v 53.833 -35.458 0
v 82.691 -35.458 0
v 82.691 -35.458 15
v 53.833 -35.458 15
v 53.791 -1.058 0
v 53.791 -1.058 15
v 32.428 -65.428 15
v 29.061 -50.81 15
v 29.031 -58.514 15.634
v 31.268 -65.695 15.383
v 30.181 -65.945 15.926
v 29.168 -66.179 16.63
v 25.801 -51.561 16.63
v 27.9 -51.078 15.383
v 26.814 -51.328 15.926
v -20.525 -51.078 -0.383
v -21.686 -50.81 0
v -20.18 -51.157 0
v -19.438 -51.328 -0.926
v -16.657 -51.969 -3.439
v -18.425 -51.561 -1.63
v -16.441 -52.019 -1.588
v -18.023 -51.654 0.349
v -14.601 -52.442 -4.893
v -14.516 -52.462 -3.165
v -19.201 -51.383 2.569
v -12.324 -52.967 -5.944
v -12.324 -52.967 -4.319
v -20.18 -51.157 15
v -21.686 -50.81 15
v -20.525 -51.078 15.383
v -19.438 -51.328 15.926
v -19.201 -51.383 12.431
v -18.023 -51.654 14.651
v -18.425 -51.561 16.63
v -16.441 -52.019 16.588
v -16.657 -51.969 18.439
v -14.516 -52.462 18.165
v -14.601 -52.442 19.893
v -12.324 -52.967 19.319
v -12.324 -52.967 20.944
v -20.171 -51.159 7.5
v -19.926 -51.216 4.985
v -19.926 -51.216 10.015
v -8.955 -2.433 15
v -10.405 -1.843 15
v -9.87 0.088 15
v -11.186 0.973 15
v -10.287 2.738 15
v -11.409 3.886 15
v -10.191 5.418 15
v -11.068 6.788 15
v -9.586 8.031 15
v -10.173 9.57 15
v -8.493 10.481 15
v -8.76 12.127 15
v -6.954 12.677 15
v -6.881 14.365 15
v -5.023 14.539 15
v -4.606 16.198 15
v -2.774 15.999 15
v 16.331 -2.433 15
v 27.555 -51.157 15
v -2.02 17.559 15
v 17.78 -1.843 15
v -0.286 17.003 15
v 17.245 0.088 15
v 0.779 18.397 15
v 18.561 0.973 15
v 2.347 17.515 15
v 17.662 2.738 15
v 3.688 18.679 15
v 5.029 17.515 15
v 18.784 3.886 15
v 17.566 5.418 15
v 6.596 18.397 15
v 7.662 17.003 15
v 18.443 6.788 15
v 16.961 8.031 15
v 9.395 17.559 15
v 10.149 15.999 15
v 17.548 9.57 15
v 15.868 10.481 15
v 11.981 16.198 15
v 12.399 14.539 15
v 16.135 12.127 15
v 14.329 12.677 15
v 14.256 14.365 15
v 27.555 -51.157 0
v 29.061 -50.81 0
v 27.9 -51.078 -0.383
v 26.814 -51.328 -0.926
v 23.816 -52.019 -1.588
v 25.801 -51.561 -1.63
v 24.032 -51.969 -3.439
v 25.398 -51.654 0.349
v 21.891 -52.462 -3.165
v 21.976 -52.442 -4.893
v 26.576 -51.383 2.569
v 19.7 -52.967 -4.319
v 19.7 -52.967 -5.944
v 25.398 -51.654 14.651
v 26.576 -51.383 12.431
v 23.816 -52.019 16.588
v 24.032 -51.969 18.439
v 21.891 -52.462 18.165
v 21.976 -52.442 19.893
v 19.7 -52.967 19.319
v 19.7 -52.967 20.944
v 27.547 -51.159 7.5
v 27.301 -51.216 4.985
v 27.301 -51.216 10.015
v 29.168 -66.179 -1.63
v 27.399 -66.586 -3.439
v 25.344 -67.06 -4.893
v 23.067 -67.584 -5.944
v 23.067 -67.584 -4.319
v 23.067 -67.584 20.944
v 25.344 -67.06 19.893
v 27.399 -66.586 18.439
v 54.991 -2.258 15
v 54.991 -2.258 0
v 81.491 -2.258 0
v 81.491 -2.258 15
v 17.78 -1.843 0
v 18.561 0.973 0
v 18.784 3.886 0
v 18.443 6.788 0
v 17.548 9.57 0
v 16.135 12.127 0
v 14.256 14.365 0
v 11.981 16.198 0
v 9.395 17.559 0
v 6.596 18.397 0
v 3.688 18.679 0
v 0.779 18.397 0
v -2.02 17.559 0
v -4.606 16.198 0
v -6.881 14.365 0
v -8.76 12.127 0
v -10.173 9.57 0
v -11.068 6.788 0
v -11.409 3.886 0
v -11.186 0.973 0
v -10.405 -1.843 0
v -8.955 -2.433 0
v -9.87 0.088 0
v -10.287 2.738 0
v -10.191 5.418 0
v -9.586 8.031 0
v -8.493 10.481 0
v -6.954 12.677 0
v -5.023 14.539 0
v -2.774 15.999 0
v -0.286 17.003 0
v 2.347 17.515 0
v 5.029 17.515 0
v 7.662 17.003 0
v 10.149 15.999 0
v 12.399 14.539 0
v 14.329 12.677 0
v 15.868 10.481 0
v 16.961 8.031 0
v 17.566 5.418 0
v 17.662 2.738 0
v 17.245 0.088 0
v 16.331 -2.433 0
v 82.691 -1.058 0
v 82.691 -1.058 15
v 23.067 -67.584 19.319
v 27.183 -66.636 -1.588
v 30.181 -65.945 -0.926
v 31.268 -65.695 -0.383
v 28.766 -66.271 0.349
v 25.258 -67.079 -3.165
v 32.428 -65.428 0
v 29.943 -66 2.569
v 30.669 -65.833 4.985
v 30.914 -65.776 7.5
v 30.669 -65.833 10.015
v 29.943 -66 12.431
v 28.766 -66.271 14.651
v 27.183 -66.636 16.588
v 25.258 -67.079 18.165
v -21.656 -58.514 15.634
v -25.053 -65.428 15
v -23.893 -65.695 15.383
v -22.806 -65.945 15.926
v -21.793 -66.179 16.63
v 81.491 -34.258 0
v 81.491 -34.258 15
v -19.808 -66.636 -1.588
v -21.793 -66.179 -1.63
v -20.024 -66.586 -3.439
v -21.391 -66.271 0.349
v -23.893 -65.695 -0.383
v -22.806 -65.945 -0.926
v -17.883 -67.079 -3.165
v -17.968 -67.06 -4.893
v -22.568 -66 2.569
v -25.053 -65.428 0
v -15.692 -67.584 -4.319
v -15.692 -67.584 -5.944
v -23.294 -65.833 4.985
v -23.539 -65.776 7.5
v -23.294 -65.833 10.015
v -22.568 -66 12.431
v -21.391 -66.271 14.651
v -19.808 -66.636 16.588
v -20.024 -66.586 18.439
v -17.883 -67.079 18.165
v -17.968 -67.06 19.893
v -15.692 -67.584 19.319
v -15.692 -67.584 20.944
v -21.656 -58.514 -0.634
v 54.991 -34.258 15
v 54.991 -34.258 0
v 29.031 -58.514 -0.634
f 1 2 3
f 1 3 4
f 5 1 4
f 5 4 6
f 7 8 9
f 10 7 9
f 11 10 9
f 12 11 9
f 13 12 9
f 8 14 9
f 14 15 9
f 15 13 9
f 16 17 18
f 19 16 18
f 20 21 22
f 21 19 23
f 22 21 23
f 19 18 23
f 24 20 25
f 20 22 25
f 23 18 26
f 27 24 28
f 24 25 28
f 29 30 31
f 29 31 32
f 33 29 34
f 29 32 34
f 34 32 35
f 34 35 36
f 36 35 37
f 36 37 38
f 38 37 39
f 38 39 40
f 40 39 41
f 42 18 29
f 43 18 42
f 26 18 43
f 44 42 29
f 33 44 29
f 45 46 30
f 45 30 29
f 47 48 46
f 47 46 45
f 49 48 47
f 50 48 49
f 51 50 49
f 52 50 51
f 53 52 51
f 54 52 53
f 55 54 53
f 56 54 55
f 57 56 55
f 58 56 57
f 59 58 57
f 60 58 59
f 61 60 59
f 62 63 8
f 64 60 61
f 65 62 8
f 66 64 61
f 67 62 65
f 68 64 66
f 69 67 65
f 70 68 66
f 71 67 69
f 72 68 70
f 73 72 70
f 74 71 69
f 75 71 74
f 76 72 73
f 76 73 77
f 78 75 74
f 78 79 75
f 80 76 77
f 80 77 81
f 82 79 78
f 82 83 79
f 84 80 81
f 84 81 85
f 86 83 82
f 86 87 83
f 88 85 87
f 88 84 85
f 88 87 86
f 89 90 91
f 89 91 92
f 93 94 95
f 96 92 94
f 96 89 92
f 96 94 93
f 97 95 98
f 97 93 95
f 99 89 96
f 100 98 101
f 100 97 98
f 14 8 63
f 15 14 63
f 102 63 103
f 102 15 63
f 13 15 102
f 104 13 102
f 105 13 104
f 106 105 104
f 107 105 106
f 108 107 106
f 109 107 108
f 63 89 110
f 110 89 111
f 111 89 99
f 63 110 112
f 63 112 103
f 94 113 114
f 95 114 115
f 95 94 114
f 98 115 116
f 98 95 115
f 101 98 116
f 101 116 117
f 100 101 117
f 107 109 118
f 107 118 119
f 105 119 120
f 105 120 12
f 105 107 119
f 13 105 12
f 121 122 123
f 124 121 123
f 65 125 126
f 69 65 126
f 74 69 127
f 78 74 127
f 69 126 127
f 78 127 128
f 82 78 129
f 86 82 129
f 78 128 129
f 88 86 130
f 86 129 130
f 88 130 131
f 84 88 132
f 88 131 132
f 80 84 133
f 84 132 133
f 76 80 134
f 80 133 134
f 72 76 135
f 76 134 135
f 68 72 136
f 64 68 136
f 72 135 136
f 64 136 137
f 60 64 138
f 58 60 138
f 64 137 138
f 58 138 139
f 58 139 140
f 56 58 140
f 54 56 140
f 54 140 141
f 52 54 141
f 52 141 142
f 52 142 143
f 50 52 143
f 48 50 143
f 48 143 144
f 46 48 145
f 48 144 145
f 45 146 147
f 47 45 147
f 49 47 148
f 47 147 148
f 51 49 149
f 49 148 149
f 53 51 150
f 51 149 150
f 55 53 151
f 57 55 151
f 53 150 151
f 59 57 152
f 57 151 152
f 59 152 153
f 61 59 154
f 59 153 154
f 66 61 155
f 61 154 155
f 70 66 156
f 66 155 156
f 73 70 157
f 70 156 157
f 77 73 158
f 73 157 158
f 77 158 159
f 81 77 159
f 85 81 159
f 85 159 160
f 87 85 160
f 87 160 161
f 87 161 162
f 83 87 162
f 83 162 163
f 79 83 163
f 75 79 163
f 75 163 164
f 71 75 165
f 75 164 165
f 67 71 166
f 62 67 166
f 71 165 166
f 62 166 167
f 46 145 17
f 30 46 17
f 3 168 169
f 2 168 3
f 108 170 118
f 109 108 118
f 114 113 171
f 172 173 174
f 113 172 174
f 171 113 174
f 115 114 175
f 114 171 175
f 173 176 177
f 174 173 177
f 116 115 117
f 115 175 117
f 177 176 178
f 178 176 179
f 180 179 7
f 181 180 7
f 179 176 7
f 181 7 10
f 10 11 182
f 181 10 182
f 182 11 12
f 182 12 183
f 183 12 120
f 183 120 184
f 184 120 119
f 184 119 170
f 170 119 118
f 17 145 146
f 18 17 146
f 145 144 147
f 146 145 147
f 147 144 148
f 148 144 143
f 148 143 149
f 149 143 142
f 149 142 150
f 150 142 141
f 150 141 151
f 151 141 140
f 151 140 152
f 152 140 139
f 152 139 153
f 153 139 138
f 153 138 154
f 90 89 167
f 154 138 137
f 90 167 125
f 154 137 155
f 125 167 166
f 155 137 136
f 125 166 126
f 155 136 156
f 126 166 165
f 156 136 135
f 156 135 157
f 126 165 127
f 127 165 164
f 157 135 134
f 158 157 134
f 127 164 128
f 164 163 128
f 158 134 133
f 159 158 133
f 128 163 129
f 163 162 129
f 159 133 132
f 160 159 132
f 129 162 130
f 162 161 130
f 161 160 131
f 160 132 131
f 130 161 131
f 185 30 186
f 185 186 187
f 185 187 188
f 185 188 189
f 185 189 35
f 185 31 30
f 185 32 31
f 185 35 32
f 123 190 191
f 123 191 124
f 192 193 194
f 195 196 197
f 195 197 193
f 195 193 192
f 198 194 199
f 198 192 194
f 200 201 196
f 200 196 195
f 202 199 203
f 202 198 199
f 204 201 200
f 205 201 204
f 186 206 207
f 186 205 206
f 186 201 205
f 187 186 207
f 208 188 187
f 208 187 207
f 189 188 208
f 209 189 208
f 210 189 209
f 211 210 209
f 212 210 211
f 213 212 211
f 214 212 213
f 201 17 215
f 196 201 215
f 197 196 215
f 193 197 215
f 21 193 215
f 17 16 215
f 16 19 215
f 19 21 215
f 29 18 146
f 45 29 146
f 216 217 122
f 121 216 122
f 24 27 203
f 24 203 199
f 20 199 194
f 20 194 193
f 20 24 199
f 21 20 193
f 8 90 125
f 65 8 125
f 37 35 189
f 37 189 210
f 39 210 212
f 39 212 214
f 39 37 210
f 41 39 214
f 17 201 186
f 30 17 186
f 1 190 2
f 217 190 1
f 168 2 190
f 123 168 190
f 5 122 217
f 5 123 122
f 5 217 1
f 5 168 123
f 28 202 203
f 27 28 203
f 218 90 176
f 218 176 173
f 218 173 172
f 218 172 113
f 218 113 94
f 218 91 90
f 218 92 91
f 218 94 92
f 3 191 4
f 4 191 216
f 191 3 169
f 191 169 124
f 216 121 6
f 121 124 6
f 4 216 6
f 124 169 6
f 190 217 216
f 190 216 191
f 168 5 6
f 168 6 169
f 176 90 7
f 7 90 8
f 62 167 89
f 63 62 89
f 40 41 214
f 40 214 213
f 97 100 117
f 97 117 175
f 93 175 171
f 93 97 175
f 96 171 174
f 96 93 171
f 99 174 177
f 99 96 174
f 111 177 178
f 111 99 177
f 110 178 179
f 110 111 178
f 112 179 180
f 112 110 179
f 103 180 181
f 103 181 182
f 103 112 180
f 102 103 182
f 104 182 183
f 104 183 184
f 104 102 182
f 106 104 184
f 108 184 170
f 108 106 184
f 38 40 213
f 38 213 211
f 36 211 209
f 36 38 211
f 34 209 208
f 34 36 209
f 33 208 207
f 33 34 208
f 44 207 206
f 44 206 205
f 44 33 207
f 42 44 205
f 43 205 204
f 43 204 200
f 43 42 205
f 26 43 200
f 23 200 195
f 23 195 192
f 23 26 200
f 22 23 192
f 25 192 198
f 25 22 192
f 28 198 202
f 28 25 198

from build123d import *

# Parameters (mm, degrees)
BOSS_EXTRUDE1_DEPTH = 15
SKETCH2_W           = 1.545443363
SKETCH2_H           = 15
BOSS_EXTRUDE2_DEPTH = 15
SKETCH3_W           = 1.545443364
SKETCH3_H           = 15
BOSS_EXTRUDE3_DEPTH = 15
SKETCH4_W           = 26.5
SKETCH4_H           = 32
BOSS_EXTRUDE4_DEPTH = 15


with BuildPart() as part:
    # Sketch1 → Boss-Extrude1 (new body)
    with BuildSketch(Plane.XY):
        with BuildLine():
            ThreePointArc((17.78047381, -1.842873049), (3.687593803, 18.679371239), (-10.405286203, -1.842873049))
            Line((-10.405286203, -1.842873049), (-21.685752651, -50.81039406))
            Line((-21.685752651, -50.81039406), (-20.179753399, -51.157325529))
            Line((-20.179753399, -51.157325529), (-8.95541876, -2.433467801))
            ThreePointArc((-8.95541876, -2.433467801), (3.687593803, 17.579371239), (16.330606367, -2.433467801))
            Line((16.330606367, -2.433467801), (27.554941006, -51.157325529))
            Line((27.554941006, -51.157325529), (29.060940258, -50.81039406))
            Line((29.060940258, -50.81039406), (17.78047381, -1.842873049))
        make_face()
    extrude(amount=BOSS_EXTRUDE1_DEPTH)

    # Sketch2 → Boss-Extrude2 (add)
    with BuildSketch(Plane(origin=(12.579642201, -54.607129649, 0), x_dir=(0.9744771545600535, 0.22448669279167044, 0), z_dir=(0.22448669279167044, -0.9744771545600535, 0))):
        with BuildLine():
            add(Edge.make_bspline(
                [(16.912965049, 0), (15.069776896, -0.453122882), (13.567239051, -1.630176533)],
                knots=[0, 0, 0, 1, 1, 1], degree=2))
            ThreePointArc((13.567239051, -1.630176533), (10.730447914, -4.213314865), (7.306496901, -5.944368606))
            Line((7.306496901, -5.944368606), (7.306496901, -4.319070277))
            ThreePointArc((7.306496901, -4.319070277), (15.358962309, 7.5), (7.306496901, 19.319070277))
            Line((7.306496901, 19.319070277), (7.306496901, 20.944368606))
            ThreePointArc((7.306496901, 20.944368606), (10.730447914, 19.213314865), (13.567239051, 16.630176533))
            add(Edge.make_bspline(
                [(16.912965049, 15), (15.069776896, 15.453122882), (13.567239051, 16.630176533)],
                knots=[0, 0, 0, 1, 1, 1], degree=2))
            Line((16.912965049, 15), (15.367521686, 15))
            Line((15.367521686, 15), (15.367521686, 0))
            Line((15.367521686, 0), (16.912965049, 0))
        make_face()
        with Locations((16.140243368, 7.5)):
            Rectangle(SKETCH2_W, SKETCH2_H)
    extrude(amount=BOSS_EXTRUDE2_DEPTH)

    # Sketch3 → Boss-Extrude3 (add)
    with BuildSketch(Plane(origin=(-12.207974967, -52.993754601, 0), x_dir=(0.9744771545600535, -0.22448669279167044, 0), z_dir=(-0.22448669279167044, -0.9744771545600535, 0))):
        with Locations((-8.953291534, 7.5)):
            Rectangle(SKETCH3_W, SKETCH3_H)
        with BuildLine():
            add(Edge.make_bspline(
                [(-9.726013216, 15), (-7.882825063, 15.453122882), (-6.380287218, 16.630176533)],
                knots=[0, 0, 0, 1, 1, 1], degree=2))
            ThreePointArc((-6.380287218, 16.630176533), (-3.543496081, 19.213314865), (-0.119545067, 20.944368606))
            Line((-0.119545067, 20.944368606), (-0.119545067, 19.319070277))
            ThreePointArc((-0.119545067, 19.319070277), (-8.172010476, 7.5), (-0.119545067, -4.319070277))
            Line((-0.119545067, -4.319070277), (-0.119545067, -5.944368606))
            ThreePointArc((-0.119545067, -5.944368606), (-3.543496081, -4.213314865), (-6.380287218, -1.630176533))
            add(Edge.make_bspline(
                [(-9.726013216, 0), (-7.882825063, -0.453122882), (-6.380287218, -1.630176533)],
                knots=[0, 0, 0, 1, 1, 1], degree=2))
            Line((-9.726013216, 0), (-8.180569852, 0))
            Line((-8.180569852, 0), (-8.180569852, 15))
            Line((-8.180569852, 15), (-9.726013216, 15))
        make_face()
    extrude(amount=BOSS_EXTRUDE3_DEPTH)


with BuildPart() as body_2:
    # Sketch4 → Boss-Extrude4 (new body)
    with BuildSketch(Plane.XY):
        Polygon((53.791493567, -1.057863552), (82.691493567, -1.057863552), (82.691493567, -35.457839056), (53.832546045, -35.457839056), align=None)
        with Locations((68.241493537, -18.257839056)):
            Rectangle(SKETCH4_W, SKETCH4_H, mode=Mode.SUBTRACT)
    extrude(amount=BOSS_EXTRUDE4_DEPTH)


solid = Compound([part.part, body_2.part])
